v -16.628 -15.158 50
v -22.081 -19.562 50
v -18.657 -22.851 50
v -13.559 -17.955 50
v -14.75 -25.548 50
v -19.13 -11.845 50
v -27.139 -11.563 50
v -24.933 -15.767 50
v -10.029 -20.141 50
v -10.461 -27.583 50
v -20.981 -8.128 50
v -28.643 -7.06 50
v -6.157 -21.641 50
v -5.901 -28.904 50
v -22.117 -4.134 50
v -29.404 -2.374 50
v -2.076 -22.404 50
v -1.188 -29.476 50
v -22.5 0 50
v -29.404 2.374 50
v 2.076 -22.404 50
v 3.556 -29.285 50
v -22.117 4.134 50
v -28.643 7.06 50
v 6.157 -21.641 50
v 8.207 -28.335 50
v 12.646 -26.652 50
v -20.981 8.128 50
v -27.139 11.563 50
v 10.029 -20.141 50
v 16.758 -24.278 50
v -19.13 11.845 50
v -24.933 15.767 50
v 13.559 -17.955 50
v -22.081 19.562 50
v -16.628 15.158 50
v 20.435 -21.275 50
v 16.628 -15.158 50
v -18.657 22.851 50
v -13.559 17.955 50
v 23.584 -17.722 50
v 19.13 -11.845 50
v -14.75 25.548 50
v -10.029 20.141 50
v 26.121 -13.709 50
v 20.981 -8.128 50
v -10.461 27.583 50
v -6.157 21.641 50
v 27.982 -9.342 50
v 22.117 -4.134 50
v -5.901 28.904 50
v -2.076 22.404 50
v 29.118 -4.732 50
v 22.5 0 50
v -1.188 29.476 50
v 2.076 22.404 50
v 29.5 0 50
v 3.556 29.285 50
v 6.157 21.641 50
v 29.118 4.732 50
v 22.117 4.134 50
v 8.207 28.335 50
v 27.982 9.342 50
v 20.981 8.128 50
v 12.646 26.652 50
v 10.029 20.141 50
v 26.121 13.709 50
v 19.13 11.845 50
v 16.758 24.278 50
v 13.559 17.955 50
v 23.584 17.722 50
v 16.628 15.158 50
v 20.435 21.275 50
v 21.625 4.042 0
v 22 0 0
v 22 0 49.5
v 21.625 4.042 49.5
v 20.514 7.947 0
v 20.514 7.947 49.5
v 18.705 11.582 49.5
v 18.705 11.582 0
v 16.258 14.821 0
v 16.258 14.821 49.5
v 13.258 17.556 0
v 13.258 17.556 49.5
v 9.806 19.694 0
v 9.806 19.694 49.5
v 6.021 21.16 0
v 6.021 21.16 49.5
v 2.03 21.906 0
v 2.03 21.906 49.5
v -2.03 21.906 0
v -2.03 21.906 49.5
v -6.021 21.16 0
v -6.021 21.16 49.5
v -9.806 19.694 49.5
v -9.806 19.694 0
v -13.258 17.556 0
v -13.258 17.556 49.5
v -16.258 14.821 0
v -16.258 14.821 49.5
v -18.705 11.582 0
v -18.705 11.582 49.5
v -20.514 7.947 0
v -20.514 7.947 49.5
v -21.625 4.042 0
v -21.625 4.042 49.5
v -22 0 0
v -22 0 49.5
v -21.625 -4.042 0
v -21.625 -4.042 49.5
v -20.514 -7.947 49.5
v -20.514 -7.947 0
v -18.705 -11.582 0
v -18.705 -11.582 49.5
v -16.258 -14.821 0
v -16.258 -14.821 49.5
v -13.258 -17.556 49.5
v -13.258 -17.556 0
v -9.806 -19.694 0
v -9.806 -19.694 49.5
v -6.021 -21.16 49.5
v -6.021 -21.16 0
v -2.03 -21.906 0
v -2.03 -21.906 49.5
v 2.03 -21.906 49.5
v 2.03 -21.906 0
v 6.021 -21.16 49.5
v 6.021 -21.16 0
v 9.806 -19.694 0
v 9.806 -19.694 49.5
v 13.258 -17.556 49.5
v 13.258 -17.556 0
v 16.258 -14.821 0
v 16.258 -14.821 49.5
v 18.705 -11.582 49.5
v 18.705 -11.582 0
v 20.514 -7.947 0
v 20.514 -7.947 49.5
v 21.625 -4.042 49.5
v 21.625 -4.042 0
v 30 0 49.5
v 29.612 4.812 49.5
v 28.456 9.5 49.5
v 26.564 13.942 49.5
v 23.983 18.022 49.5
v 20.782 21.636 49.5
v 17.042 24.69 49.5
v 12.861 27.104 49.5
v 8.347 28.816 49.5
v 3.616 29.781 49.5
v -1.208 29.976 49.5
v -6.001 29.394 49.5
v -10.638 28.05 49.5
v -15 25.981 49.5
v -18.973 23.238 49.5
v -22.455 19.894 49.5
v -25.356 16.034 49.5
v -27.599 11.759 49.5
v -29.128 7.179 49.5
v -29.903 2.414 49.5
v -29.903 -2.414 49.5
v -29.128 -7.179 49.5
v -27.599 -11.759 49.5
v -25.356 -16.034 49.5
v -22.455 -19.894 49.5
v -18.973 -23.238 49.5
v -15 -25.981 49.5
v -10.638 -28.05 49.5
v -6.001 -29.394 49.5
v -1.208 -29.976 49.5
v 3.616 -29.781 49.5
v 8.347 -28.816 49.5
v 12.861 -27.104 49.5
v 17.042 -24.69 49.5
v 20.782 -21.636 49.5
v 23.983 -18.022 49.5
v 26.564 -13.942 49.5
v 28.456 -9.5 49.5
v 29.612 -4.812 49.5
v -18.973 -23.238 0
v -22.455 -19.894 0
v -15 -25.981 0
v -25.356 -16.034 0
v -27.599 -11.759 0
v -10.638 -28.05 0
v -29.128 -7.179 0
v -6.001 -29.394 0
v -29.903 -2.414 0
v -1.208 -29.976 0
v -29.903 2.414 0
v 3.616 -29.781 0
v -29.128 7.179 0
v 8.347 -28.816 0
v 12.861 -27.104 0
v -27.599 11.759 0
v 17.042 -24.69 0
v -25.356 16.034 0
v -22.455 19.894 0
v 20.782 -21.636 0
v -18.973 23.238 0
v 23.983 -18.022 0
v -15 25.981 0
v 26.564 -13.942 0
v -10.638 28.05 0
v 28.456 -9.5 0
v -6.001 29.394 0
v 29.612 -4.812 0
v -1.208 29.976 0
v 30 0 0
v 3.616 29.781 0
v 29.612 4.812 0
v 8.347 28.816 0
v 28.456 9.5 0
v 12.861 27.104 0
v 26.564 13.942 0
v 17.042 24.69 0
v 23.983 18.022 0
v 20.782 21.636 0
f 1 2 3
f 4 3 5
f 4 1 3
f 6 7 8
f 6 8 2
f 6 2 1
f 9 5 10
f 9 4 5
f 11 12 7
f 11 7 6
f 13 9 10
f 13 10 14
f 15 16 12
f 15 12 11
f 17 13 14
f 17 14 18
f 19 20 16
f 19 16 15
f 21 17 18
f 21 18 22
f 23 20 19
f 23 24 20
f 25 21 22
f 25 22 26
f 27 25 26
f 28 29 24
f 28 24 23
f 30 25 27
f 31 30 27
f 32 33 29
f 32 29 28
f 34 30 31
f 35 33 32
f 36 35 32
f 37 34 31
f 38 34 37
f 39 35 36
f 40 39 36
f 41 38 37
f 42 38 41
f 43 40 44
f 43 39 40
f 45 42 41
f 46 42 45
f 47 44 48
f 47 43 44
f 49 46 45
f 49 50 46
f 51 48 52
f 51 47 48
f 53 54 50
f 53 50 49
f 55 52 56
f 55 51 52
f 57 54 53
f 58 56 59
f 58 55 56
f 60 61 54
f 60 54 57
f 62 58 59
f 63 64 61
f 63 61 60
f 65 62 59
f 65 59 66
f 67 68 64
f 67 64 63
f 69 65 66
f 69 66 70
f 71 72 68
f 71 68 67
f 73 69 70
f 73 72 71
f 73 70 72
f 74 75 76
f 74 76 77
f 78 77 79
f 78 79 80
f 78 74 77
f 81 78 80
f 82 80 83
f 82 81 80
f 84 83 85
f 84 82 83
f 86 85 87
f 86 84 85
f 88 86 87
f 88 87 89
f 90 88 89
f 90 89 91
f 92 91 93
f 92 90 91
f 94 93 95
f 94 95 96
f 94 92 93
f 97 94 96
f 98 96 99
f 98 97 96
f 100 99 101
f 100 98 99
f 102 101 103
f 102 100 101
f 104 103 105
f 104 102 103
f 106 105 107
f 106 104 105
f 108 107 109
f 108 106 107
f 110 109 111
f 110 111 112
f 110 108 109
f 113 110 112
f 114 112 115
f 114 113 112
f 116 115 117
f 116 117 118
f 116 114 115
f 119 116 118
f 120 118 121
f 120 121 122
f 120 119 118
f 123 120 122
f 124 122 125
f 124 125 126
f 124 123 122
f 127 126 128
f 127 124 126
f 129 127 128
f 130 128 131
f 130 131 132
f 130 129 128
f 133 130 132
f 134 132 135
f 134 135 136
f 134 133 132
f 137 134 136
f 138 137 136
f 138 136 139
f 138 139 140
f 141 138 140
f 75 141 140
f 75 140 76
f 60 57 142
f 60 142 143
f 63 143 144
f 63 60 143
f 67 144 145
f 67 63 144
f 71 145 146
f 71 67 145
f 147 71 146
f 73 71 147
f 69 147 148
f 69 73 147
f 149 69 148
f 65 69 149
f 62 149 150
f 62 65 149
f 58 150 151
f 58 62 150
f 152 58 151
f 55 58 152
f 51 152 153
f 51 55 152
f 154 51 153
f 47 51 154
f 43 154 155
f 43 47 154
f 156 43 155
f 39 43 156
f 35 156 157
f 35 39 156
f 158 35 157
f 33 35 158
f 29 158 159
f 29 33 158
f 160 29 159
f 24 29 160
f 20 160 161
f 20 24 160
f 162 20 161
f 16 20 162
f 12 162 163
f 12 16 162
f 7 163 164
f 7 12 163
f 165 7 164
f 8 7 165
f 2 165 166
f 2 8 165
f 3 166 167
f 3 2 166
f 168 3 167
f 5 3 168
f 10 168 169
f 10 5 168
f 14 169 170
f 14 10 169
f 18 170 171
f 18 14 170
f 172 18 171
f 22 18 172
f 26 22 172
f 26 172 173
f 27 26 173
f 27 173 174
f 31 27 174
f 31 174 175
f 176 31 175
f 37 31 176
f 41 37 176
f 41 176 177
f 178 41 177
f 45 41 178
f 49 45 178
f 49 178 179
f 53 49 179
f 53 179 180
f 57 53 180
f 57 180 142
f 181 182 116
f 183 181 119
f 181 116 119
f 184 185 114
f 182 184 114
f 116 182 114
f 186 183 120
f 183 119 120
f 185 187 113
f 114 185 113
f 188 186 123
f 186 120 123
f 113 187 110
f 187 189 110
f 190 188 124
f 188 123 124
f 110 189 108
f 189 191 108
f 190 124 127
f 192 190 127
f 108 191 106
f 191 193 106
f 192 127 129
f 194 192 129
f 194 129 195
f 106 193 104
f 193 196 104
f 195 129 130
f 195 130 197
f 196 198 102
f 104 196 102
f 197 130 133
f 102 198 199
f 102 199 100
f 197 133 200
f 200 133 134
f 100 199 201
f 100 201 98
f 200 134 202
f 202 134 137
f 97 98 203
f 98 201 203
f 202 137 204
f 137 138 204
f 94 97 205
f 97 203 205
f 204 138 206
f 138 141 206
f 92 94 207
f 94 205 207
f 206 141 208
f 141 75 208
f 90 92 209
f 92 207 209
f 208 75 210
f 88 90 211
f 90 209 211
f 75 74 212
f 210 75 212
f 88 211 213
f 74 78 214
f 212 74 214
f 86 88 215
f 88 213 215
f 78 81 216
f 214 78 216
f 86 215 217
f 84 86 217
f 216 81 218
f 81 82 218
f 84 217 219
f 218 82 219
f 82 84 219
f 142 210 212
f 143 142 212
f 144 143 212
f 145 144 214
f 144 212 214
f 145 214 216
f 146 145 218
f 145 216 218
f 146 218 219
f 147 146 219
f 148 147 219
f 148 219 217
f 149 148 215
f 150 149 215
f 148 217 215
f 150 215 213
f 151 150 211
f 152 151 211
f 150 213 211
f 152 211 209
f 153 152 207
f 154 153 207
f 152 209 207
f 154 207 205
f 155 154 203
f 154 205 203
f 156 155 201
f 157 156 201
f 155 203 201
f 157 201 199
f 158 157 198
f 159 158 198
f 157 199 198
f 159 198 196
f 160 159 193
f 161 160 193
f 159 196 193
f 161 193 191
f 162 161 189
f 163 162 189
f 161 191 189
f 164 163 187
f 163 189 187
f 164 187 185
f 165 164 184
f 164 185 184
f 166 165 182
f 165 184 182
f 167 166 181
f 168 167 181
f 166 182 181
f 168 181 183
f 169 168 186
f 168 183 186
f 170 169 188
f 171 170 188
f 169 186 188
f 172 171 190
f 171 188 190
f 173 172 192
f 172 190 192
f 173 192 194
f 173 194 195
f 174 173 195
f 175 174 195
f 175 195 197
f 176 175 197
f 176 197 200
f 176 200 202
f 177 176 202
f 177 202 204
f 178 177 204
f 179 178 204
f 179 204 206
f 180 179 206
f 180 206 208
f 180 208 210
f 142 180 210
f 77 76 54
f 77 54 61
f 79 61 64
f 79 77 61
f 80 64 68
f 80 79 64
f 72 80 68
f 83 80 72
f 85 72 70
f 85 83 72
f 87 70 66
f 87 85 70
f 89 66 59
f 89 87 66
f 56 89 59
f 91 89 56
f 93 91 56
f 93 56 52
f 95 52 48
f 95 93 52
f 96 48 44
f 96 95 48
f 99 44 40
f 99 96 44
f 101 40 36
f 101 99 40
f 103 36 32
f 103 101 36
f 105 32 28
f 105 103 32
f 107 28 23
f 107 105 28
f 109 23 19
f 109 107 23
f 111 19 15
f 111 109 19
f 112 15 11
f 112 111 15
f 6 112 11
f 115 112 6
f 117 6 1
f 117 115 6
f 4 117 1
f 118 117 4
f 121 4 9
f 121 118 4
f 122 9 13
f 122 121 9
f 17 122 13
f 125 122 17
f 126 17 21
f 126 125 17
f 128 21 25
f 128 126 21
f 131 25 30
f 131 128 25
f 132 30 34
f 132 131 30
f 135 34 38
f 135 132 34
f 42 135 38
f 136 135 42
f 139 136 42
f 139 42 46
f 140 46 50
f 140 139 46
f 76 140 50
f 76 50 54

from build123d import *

# Parameters (mm, degrees)
F0_R     = 30
F0_R_2   = 22
F1_DEPTH = 50
F2_SIZE  = 0.5
F3_SIZE  = 0.5


with BuildPart() as f1:
    # F0 (on Top) → F1 (new body)
    with BuildSketch(Plane.XY):
        Circle(F0_R)
        Circle(F0_R_2, mode=Mode.SUBTRACT)
    extrude(amount=F1_DEPTH)

    # F2
    f2_edges = [f1.edges().sort_by_distance(p)[0] for p in [
        (-30, 0, 50),
    ]]
    chamfer(f2_edges, length=F2_SIZE)

    # F3
    f3_edges = [f1.edges().sort_by_distance(p)[0] for p in [
        (-22, 0, 50),
    ]]
    chamfer(f3_edges, length=F3_SIZE)


solid = f1.part
